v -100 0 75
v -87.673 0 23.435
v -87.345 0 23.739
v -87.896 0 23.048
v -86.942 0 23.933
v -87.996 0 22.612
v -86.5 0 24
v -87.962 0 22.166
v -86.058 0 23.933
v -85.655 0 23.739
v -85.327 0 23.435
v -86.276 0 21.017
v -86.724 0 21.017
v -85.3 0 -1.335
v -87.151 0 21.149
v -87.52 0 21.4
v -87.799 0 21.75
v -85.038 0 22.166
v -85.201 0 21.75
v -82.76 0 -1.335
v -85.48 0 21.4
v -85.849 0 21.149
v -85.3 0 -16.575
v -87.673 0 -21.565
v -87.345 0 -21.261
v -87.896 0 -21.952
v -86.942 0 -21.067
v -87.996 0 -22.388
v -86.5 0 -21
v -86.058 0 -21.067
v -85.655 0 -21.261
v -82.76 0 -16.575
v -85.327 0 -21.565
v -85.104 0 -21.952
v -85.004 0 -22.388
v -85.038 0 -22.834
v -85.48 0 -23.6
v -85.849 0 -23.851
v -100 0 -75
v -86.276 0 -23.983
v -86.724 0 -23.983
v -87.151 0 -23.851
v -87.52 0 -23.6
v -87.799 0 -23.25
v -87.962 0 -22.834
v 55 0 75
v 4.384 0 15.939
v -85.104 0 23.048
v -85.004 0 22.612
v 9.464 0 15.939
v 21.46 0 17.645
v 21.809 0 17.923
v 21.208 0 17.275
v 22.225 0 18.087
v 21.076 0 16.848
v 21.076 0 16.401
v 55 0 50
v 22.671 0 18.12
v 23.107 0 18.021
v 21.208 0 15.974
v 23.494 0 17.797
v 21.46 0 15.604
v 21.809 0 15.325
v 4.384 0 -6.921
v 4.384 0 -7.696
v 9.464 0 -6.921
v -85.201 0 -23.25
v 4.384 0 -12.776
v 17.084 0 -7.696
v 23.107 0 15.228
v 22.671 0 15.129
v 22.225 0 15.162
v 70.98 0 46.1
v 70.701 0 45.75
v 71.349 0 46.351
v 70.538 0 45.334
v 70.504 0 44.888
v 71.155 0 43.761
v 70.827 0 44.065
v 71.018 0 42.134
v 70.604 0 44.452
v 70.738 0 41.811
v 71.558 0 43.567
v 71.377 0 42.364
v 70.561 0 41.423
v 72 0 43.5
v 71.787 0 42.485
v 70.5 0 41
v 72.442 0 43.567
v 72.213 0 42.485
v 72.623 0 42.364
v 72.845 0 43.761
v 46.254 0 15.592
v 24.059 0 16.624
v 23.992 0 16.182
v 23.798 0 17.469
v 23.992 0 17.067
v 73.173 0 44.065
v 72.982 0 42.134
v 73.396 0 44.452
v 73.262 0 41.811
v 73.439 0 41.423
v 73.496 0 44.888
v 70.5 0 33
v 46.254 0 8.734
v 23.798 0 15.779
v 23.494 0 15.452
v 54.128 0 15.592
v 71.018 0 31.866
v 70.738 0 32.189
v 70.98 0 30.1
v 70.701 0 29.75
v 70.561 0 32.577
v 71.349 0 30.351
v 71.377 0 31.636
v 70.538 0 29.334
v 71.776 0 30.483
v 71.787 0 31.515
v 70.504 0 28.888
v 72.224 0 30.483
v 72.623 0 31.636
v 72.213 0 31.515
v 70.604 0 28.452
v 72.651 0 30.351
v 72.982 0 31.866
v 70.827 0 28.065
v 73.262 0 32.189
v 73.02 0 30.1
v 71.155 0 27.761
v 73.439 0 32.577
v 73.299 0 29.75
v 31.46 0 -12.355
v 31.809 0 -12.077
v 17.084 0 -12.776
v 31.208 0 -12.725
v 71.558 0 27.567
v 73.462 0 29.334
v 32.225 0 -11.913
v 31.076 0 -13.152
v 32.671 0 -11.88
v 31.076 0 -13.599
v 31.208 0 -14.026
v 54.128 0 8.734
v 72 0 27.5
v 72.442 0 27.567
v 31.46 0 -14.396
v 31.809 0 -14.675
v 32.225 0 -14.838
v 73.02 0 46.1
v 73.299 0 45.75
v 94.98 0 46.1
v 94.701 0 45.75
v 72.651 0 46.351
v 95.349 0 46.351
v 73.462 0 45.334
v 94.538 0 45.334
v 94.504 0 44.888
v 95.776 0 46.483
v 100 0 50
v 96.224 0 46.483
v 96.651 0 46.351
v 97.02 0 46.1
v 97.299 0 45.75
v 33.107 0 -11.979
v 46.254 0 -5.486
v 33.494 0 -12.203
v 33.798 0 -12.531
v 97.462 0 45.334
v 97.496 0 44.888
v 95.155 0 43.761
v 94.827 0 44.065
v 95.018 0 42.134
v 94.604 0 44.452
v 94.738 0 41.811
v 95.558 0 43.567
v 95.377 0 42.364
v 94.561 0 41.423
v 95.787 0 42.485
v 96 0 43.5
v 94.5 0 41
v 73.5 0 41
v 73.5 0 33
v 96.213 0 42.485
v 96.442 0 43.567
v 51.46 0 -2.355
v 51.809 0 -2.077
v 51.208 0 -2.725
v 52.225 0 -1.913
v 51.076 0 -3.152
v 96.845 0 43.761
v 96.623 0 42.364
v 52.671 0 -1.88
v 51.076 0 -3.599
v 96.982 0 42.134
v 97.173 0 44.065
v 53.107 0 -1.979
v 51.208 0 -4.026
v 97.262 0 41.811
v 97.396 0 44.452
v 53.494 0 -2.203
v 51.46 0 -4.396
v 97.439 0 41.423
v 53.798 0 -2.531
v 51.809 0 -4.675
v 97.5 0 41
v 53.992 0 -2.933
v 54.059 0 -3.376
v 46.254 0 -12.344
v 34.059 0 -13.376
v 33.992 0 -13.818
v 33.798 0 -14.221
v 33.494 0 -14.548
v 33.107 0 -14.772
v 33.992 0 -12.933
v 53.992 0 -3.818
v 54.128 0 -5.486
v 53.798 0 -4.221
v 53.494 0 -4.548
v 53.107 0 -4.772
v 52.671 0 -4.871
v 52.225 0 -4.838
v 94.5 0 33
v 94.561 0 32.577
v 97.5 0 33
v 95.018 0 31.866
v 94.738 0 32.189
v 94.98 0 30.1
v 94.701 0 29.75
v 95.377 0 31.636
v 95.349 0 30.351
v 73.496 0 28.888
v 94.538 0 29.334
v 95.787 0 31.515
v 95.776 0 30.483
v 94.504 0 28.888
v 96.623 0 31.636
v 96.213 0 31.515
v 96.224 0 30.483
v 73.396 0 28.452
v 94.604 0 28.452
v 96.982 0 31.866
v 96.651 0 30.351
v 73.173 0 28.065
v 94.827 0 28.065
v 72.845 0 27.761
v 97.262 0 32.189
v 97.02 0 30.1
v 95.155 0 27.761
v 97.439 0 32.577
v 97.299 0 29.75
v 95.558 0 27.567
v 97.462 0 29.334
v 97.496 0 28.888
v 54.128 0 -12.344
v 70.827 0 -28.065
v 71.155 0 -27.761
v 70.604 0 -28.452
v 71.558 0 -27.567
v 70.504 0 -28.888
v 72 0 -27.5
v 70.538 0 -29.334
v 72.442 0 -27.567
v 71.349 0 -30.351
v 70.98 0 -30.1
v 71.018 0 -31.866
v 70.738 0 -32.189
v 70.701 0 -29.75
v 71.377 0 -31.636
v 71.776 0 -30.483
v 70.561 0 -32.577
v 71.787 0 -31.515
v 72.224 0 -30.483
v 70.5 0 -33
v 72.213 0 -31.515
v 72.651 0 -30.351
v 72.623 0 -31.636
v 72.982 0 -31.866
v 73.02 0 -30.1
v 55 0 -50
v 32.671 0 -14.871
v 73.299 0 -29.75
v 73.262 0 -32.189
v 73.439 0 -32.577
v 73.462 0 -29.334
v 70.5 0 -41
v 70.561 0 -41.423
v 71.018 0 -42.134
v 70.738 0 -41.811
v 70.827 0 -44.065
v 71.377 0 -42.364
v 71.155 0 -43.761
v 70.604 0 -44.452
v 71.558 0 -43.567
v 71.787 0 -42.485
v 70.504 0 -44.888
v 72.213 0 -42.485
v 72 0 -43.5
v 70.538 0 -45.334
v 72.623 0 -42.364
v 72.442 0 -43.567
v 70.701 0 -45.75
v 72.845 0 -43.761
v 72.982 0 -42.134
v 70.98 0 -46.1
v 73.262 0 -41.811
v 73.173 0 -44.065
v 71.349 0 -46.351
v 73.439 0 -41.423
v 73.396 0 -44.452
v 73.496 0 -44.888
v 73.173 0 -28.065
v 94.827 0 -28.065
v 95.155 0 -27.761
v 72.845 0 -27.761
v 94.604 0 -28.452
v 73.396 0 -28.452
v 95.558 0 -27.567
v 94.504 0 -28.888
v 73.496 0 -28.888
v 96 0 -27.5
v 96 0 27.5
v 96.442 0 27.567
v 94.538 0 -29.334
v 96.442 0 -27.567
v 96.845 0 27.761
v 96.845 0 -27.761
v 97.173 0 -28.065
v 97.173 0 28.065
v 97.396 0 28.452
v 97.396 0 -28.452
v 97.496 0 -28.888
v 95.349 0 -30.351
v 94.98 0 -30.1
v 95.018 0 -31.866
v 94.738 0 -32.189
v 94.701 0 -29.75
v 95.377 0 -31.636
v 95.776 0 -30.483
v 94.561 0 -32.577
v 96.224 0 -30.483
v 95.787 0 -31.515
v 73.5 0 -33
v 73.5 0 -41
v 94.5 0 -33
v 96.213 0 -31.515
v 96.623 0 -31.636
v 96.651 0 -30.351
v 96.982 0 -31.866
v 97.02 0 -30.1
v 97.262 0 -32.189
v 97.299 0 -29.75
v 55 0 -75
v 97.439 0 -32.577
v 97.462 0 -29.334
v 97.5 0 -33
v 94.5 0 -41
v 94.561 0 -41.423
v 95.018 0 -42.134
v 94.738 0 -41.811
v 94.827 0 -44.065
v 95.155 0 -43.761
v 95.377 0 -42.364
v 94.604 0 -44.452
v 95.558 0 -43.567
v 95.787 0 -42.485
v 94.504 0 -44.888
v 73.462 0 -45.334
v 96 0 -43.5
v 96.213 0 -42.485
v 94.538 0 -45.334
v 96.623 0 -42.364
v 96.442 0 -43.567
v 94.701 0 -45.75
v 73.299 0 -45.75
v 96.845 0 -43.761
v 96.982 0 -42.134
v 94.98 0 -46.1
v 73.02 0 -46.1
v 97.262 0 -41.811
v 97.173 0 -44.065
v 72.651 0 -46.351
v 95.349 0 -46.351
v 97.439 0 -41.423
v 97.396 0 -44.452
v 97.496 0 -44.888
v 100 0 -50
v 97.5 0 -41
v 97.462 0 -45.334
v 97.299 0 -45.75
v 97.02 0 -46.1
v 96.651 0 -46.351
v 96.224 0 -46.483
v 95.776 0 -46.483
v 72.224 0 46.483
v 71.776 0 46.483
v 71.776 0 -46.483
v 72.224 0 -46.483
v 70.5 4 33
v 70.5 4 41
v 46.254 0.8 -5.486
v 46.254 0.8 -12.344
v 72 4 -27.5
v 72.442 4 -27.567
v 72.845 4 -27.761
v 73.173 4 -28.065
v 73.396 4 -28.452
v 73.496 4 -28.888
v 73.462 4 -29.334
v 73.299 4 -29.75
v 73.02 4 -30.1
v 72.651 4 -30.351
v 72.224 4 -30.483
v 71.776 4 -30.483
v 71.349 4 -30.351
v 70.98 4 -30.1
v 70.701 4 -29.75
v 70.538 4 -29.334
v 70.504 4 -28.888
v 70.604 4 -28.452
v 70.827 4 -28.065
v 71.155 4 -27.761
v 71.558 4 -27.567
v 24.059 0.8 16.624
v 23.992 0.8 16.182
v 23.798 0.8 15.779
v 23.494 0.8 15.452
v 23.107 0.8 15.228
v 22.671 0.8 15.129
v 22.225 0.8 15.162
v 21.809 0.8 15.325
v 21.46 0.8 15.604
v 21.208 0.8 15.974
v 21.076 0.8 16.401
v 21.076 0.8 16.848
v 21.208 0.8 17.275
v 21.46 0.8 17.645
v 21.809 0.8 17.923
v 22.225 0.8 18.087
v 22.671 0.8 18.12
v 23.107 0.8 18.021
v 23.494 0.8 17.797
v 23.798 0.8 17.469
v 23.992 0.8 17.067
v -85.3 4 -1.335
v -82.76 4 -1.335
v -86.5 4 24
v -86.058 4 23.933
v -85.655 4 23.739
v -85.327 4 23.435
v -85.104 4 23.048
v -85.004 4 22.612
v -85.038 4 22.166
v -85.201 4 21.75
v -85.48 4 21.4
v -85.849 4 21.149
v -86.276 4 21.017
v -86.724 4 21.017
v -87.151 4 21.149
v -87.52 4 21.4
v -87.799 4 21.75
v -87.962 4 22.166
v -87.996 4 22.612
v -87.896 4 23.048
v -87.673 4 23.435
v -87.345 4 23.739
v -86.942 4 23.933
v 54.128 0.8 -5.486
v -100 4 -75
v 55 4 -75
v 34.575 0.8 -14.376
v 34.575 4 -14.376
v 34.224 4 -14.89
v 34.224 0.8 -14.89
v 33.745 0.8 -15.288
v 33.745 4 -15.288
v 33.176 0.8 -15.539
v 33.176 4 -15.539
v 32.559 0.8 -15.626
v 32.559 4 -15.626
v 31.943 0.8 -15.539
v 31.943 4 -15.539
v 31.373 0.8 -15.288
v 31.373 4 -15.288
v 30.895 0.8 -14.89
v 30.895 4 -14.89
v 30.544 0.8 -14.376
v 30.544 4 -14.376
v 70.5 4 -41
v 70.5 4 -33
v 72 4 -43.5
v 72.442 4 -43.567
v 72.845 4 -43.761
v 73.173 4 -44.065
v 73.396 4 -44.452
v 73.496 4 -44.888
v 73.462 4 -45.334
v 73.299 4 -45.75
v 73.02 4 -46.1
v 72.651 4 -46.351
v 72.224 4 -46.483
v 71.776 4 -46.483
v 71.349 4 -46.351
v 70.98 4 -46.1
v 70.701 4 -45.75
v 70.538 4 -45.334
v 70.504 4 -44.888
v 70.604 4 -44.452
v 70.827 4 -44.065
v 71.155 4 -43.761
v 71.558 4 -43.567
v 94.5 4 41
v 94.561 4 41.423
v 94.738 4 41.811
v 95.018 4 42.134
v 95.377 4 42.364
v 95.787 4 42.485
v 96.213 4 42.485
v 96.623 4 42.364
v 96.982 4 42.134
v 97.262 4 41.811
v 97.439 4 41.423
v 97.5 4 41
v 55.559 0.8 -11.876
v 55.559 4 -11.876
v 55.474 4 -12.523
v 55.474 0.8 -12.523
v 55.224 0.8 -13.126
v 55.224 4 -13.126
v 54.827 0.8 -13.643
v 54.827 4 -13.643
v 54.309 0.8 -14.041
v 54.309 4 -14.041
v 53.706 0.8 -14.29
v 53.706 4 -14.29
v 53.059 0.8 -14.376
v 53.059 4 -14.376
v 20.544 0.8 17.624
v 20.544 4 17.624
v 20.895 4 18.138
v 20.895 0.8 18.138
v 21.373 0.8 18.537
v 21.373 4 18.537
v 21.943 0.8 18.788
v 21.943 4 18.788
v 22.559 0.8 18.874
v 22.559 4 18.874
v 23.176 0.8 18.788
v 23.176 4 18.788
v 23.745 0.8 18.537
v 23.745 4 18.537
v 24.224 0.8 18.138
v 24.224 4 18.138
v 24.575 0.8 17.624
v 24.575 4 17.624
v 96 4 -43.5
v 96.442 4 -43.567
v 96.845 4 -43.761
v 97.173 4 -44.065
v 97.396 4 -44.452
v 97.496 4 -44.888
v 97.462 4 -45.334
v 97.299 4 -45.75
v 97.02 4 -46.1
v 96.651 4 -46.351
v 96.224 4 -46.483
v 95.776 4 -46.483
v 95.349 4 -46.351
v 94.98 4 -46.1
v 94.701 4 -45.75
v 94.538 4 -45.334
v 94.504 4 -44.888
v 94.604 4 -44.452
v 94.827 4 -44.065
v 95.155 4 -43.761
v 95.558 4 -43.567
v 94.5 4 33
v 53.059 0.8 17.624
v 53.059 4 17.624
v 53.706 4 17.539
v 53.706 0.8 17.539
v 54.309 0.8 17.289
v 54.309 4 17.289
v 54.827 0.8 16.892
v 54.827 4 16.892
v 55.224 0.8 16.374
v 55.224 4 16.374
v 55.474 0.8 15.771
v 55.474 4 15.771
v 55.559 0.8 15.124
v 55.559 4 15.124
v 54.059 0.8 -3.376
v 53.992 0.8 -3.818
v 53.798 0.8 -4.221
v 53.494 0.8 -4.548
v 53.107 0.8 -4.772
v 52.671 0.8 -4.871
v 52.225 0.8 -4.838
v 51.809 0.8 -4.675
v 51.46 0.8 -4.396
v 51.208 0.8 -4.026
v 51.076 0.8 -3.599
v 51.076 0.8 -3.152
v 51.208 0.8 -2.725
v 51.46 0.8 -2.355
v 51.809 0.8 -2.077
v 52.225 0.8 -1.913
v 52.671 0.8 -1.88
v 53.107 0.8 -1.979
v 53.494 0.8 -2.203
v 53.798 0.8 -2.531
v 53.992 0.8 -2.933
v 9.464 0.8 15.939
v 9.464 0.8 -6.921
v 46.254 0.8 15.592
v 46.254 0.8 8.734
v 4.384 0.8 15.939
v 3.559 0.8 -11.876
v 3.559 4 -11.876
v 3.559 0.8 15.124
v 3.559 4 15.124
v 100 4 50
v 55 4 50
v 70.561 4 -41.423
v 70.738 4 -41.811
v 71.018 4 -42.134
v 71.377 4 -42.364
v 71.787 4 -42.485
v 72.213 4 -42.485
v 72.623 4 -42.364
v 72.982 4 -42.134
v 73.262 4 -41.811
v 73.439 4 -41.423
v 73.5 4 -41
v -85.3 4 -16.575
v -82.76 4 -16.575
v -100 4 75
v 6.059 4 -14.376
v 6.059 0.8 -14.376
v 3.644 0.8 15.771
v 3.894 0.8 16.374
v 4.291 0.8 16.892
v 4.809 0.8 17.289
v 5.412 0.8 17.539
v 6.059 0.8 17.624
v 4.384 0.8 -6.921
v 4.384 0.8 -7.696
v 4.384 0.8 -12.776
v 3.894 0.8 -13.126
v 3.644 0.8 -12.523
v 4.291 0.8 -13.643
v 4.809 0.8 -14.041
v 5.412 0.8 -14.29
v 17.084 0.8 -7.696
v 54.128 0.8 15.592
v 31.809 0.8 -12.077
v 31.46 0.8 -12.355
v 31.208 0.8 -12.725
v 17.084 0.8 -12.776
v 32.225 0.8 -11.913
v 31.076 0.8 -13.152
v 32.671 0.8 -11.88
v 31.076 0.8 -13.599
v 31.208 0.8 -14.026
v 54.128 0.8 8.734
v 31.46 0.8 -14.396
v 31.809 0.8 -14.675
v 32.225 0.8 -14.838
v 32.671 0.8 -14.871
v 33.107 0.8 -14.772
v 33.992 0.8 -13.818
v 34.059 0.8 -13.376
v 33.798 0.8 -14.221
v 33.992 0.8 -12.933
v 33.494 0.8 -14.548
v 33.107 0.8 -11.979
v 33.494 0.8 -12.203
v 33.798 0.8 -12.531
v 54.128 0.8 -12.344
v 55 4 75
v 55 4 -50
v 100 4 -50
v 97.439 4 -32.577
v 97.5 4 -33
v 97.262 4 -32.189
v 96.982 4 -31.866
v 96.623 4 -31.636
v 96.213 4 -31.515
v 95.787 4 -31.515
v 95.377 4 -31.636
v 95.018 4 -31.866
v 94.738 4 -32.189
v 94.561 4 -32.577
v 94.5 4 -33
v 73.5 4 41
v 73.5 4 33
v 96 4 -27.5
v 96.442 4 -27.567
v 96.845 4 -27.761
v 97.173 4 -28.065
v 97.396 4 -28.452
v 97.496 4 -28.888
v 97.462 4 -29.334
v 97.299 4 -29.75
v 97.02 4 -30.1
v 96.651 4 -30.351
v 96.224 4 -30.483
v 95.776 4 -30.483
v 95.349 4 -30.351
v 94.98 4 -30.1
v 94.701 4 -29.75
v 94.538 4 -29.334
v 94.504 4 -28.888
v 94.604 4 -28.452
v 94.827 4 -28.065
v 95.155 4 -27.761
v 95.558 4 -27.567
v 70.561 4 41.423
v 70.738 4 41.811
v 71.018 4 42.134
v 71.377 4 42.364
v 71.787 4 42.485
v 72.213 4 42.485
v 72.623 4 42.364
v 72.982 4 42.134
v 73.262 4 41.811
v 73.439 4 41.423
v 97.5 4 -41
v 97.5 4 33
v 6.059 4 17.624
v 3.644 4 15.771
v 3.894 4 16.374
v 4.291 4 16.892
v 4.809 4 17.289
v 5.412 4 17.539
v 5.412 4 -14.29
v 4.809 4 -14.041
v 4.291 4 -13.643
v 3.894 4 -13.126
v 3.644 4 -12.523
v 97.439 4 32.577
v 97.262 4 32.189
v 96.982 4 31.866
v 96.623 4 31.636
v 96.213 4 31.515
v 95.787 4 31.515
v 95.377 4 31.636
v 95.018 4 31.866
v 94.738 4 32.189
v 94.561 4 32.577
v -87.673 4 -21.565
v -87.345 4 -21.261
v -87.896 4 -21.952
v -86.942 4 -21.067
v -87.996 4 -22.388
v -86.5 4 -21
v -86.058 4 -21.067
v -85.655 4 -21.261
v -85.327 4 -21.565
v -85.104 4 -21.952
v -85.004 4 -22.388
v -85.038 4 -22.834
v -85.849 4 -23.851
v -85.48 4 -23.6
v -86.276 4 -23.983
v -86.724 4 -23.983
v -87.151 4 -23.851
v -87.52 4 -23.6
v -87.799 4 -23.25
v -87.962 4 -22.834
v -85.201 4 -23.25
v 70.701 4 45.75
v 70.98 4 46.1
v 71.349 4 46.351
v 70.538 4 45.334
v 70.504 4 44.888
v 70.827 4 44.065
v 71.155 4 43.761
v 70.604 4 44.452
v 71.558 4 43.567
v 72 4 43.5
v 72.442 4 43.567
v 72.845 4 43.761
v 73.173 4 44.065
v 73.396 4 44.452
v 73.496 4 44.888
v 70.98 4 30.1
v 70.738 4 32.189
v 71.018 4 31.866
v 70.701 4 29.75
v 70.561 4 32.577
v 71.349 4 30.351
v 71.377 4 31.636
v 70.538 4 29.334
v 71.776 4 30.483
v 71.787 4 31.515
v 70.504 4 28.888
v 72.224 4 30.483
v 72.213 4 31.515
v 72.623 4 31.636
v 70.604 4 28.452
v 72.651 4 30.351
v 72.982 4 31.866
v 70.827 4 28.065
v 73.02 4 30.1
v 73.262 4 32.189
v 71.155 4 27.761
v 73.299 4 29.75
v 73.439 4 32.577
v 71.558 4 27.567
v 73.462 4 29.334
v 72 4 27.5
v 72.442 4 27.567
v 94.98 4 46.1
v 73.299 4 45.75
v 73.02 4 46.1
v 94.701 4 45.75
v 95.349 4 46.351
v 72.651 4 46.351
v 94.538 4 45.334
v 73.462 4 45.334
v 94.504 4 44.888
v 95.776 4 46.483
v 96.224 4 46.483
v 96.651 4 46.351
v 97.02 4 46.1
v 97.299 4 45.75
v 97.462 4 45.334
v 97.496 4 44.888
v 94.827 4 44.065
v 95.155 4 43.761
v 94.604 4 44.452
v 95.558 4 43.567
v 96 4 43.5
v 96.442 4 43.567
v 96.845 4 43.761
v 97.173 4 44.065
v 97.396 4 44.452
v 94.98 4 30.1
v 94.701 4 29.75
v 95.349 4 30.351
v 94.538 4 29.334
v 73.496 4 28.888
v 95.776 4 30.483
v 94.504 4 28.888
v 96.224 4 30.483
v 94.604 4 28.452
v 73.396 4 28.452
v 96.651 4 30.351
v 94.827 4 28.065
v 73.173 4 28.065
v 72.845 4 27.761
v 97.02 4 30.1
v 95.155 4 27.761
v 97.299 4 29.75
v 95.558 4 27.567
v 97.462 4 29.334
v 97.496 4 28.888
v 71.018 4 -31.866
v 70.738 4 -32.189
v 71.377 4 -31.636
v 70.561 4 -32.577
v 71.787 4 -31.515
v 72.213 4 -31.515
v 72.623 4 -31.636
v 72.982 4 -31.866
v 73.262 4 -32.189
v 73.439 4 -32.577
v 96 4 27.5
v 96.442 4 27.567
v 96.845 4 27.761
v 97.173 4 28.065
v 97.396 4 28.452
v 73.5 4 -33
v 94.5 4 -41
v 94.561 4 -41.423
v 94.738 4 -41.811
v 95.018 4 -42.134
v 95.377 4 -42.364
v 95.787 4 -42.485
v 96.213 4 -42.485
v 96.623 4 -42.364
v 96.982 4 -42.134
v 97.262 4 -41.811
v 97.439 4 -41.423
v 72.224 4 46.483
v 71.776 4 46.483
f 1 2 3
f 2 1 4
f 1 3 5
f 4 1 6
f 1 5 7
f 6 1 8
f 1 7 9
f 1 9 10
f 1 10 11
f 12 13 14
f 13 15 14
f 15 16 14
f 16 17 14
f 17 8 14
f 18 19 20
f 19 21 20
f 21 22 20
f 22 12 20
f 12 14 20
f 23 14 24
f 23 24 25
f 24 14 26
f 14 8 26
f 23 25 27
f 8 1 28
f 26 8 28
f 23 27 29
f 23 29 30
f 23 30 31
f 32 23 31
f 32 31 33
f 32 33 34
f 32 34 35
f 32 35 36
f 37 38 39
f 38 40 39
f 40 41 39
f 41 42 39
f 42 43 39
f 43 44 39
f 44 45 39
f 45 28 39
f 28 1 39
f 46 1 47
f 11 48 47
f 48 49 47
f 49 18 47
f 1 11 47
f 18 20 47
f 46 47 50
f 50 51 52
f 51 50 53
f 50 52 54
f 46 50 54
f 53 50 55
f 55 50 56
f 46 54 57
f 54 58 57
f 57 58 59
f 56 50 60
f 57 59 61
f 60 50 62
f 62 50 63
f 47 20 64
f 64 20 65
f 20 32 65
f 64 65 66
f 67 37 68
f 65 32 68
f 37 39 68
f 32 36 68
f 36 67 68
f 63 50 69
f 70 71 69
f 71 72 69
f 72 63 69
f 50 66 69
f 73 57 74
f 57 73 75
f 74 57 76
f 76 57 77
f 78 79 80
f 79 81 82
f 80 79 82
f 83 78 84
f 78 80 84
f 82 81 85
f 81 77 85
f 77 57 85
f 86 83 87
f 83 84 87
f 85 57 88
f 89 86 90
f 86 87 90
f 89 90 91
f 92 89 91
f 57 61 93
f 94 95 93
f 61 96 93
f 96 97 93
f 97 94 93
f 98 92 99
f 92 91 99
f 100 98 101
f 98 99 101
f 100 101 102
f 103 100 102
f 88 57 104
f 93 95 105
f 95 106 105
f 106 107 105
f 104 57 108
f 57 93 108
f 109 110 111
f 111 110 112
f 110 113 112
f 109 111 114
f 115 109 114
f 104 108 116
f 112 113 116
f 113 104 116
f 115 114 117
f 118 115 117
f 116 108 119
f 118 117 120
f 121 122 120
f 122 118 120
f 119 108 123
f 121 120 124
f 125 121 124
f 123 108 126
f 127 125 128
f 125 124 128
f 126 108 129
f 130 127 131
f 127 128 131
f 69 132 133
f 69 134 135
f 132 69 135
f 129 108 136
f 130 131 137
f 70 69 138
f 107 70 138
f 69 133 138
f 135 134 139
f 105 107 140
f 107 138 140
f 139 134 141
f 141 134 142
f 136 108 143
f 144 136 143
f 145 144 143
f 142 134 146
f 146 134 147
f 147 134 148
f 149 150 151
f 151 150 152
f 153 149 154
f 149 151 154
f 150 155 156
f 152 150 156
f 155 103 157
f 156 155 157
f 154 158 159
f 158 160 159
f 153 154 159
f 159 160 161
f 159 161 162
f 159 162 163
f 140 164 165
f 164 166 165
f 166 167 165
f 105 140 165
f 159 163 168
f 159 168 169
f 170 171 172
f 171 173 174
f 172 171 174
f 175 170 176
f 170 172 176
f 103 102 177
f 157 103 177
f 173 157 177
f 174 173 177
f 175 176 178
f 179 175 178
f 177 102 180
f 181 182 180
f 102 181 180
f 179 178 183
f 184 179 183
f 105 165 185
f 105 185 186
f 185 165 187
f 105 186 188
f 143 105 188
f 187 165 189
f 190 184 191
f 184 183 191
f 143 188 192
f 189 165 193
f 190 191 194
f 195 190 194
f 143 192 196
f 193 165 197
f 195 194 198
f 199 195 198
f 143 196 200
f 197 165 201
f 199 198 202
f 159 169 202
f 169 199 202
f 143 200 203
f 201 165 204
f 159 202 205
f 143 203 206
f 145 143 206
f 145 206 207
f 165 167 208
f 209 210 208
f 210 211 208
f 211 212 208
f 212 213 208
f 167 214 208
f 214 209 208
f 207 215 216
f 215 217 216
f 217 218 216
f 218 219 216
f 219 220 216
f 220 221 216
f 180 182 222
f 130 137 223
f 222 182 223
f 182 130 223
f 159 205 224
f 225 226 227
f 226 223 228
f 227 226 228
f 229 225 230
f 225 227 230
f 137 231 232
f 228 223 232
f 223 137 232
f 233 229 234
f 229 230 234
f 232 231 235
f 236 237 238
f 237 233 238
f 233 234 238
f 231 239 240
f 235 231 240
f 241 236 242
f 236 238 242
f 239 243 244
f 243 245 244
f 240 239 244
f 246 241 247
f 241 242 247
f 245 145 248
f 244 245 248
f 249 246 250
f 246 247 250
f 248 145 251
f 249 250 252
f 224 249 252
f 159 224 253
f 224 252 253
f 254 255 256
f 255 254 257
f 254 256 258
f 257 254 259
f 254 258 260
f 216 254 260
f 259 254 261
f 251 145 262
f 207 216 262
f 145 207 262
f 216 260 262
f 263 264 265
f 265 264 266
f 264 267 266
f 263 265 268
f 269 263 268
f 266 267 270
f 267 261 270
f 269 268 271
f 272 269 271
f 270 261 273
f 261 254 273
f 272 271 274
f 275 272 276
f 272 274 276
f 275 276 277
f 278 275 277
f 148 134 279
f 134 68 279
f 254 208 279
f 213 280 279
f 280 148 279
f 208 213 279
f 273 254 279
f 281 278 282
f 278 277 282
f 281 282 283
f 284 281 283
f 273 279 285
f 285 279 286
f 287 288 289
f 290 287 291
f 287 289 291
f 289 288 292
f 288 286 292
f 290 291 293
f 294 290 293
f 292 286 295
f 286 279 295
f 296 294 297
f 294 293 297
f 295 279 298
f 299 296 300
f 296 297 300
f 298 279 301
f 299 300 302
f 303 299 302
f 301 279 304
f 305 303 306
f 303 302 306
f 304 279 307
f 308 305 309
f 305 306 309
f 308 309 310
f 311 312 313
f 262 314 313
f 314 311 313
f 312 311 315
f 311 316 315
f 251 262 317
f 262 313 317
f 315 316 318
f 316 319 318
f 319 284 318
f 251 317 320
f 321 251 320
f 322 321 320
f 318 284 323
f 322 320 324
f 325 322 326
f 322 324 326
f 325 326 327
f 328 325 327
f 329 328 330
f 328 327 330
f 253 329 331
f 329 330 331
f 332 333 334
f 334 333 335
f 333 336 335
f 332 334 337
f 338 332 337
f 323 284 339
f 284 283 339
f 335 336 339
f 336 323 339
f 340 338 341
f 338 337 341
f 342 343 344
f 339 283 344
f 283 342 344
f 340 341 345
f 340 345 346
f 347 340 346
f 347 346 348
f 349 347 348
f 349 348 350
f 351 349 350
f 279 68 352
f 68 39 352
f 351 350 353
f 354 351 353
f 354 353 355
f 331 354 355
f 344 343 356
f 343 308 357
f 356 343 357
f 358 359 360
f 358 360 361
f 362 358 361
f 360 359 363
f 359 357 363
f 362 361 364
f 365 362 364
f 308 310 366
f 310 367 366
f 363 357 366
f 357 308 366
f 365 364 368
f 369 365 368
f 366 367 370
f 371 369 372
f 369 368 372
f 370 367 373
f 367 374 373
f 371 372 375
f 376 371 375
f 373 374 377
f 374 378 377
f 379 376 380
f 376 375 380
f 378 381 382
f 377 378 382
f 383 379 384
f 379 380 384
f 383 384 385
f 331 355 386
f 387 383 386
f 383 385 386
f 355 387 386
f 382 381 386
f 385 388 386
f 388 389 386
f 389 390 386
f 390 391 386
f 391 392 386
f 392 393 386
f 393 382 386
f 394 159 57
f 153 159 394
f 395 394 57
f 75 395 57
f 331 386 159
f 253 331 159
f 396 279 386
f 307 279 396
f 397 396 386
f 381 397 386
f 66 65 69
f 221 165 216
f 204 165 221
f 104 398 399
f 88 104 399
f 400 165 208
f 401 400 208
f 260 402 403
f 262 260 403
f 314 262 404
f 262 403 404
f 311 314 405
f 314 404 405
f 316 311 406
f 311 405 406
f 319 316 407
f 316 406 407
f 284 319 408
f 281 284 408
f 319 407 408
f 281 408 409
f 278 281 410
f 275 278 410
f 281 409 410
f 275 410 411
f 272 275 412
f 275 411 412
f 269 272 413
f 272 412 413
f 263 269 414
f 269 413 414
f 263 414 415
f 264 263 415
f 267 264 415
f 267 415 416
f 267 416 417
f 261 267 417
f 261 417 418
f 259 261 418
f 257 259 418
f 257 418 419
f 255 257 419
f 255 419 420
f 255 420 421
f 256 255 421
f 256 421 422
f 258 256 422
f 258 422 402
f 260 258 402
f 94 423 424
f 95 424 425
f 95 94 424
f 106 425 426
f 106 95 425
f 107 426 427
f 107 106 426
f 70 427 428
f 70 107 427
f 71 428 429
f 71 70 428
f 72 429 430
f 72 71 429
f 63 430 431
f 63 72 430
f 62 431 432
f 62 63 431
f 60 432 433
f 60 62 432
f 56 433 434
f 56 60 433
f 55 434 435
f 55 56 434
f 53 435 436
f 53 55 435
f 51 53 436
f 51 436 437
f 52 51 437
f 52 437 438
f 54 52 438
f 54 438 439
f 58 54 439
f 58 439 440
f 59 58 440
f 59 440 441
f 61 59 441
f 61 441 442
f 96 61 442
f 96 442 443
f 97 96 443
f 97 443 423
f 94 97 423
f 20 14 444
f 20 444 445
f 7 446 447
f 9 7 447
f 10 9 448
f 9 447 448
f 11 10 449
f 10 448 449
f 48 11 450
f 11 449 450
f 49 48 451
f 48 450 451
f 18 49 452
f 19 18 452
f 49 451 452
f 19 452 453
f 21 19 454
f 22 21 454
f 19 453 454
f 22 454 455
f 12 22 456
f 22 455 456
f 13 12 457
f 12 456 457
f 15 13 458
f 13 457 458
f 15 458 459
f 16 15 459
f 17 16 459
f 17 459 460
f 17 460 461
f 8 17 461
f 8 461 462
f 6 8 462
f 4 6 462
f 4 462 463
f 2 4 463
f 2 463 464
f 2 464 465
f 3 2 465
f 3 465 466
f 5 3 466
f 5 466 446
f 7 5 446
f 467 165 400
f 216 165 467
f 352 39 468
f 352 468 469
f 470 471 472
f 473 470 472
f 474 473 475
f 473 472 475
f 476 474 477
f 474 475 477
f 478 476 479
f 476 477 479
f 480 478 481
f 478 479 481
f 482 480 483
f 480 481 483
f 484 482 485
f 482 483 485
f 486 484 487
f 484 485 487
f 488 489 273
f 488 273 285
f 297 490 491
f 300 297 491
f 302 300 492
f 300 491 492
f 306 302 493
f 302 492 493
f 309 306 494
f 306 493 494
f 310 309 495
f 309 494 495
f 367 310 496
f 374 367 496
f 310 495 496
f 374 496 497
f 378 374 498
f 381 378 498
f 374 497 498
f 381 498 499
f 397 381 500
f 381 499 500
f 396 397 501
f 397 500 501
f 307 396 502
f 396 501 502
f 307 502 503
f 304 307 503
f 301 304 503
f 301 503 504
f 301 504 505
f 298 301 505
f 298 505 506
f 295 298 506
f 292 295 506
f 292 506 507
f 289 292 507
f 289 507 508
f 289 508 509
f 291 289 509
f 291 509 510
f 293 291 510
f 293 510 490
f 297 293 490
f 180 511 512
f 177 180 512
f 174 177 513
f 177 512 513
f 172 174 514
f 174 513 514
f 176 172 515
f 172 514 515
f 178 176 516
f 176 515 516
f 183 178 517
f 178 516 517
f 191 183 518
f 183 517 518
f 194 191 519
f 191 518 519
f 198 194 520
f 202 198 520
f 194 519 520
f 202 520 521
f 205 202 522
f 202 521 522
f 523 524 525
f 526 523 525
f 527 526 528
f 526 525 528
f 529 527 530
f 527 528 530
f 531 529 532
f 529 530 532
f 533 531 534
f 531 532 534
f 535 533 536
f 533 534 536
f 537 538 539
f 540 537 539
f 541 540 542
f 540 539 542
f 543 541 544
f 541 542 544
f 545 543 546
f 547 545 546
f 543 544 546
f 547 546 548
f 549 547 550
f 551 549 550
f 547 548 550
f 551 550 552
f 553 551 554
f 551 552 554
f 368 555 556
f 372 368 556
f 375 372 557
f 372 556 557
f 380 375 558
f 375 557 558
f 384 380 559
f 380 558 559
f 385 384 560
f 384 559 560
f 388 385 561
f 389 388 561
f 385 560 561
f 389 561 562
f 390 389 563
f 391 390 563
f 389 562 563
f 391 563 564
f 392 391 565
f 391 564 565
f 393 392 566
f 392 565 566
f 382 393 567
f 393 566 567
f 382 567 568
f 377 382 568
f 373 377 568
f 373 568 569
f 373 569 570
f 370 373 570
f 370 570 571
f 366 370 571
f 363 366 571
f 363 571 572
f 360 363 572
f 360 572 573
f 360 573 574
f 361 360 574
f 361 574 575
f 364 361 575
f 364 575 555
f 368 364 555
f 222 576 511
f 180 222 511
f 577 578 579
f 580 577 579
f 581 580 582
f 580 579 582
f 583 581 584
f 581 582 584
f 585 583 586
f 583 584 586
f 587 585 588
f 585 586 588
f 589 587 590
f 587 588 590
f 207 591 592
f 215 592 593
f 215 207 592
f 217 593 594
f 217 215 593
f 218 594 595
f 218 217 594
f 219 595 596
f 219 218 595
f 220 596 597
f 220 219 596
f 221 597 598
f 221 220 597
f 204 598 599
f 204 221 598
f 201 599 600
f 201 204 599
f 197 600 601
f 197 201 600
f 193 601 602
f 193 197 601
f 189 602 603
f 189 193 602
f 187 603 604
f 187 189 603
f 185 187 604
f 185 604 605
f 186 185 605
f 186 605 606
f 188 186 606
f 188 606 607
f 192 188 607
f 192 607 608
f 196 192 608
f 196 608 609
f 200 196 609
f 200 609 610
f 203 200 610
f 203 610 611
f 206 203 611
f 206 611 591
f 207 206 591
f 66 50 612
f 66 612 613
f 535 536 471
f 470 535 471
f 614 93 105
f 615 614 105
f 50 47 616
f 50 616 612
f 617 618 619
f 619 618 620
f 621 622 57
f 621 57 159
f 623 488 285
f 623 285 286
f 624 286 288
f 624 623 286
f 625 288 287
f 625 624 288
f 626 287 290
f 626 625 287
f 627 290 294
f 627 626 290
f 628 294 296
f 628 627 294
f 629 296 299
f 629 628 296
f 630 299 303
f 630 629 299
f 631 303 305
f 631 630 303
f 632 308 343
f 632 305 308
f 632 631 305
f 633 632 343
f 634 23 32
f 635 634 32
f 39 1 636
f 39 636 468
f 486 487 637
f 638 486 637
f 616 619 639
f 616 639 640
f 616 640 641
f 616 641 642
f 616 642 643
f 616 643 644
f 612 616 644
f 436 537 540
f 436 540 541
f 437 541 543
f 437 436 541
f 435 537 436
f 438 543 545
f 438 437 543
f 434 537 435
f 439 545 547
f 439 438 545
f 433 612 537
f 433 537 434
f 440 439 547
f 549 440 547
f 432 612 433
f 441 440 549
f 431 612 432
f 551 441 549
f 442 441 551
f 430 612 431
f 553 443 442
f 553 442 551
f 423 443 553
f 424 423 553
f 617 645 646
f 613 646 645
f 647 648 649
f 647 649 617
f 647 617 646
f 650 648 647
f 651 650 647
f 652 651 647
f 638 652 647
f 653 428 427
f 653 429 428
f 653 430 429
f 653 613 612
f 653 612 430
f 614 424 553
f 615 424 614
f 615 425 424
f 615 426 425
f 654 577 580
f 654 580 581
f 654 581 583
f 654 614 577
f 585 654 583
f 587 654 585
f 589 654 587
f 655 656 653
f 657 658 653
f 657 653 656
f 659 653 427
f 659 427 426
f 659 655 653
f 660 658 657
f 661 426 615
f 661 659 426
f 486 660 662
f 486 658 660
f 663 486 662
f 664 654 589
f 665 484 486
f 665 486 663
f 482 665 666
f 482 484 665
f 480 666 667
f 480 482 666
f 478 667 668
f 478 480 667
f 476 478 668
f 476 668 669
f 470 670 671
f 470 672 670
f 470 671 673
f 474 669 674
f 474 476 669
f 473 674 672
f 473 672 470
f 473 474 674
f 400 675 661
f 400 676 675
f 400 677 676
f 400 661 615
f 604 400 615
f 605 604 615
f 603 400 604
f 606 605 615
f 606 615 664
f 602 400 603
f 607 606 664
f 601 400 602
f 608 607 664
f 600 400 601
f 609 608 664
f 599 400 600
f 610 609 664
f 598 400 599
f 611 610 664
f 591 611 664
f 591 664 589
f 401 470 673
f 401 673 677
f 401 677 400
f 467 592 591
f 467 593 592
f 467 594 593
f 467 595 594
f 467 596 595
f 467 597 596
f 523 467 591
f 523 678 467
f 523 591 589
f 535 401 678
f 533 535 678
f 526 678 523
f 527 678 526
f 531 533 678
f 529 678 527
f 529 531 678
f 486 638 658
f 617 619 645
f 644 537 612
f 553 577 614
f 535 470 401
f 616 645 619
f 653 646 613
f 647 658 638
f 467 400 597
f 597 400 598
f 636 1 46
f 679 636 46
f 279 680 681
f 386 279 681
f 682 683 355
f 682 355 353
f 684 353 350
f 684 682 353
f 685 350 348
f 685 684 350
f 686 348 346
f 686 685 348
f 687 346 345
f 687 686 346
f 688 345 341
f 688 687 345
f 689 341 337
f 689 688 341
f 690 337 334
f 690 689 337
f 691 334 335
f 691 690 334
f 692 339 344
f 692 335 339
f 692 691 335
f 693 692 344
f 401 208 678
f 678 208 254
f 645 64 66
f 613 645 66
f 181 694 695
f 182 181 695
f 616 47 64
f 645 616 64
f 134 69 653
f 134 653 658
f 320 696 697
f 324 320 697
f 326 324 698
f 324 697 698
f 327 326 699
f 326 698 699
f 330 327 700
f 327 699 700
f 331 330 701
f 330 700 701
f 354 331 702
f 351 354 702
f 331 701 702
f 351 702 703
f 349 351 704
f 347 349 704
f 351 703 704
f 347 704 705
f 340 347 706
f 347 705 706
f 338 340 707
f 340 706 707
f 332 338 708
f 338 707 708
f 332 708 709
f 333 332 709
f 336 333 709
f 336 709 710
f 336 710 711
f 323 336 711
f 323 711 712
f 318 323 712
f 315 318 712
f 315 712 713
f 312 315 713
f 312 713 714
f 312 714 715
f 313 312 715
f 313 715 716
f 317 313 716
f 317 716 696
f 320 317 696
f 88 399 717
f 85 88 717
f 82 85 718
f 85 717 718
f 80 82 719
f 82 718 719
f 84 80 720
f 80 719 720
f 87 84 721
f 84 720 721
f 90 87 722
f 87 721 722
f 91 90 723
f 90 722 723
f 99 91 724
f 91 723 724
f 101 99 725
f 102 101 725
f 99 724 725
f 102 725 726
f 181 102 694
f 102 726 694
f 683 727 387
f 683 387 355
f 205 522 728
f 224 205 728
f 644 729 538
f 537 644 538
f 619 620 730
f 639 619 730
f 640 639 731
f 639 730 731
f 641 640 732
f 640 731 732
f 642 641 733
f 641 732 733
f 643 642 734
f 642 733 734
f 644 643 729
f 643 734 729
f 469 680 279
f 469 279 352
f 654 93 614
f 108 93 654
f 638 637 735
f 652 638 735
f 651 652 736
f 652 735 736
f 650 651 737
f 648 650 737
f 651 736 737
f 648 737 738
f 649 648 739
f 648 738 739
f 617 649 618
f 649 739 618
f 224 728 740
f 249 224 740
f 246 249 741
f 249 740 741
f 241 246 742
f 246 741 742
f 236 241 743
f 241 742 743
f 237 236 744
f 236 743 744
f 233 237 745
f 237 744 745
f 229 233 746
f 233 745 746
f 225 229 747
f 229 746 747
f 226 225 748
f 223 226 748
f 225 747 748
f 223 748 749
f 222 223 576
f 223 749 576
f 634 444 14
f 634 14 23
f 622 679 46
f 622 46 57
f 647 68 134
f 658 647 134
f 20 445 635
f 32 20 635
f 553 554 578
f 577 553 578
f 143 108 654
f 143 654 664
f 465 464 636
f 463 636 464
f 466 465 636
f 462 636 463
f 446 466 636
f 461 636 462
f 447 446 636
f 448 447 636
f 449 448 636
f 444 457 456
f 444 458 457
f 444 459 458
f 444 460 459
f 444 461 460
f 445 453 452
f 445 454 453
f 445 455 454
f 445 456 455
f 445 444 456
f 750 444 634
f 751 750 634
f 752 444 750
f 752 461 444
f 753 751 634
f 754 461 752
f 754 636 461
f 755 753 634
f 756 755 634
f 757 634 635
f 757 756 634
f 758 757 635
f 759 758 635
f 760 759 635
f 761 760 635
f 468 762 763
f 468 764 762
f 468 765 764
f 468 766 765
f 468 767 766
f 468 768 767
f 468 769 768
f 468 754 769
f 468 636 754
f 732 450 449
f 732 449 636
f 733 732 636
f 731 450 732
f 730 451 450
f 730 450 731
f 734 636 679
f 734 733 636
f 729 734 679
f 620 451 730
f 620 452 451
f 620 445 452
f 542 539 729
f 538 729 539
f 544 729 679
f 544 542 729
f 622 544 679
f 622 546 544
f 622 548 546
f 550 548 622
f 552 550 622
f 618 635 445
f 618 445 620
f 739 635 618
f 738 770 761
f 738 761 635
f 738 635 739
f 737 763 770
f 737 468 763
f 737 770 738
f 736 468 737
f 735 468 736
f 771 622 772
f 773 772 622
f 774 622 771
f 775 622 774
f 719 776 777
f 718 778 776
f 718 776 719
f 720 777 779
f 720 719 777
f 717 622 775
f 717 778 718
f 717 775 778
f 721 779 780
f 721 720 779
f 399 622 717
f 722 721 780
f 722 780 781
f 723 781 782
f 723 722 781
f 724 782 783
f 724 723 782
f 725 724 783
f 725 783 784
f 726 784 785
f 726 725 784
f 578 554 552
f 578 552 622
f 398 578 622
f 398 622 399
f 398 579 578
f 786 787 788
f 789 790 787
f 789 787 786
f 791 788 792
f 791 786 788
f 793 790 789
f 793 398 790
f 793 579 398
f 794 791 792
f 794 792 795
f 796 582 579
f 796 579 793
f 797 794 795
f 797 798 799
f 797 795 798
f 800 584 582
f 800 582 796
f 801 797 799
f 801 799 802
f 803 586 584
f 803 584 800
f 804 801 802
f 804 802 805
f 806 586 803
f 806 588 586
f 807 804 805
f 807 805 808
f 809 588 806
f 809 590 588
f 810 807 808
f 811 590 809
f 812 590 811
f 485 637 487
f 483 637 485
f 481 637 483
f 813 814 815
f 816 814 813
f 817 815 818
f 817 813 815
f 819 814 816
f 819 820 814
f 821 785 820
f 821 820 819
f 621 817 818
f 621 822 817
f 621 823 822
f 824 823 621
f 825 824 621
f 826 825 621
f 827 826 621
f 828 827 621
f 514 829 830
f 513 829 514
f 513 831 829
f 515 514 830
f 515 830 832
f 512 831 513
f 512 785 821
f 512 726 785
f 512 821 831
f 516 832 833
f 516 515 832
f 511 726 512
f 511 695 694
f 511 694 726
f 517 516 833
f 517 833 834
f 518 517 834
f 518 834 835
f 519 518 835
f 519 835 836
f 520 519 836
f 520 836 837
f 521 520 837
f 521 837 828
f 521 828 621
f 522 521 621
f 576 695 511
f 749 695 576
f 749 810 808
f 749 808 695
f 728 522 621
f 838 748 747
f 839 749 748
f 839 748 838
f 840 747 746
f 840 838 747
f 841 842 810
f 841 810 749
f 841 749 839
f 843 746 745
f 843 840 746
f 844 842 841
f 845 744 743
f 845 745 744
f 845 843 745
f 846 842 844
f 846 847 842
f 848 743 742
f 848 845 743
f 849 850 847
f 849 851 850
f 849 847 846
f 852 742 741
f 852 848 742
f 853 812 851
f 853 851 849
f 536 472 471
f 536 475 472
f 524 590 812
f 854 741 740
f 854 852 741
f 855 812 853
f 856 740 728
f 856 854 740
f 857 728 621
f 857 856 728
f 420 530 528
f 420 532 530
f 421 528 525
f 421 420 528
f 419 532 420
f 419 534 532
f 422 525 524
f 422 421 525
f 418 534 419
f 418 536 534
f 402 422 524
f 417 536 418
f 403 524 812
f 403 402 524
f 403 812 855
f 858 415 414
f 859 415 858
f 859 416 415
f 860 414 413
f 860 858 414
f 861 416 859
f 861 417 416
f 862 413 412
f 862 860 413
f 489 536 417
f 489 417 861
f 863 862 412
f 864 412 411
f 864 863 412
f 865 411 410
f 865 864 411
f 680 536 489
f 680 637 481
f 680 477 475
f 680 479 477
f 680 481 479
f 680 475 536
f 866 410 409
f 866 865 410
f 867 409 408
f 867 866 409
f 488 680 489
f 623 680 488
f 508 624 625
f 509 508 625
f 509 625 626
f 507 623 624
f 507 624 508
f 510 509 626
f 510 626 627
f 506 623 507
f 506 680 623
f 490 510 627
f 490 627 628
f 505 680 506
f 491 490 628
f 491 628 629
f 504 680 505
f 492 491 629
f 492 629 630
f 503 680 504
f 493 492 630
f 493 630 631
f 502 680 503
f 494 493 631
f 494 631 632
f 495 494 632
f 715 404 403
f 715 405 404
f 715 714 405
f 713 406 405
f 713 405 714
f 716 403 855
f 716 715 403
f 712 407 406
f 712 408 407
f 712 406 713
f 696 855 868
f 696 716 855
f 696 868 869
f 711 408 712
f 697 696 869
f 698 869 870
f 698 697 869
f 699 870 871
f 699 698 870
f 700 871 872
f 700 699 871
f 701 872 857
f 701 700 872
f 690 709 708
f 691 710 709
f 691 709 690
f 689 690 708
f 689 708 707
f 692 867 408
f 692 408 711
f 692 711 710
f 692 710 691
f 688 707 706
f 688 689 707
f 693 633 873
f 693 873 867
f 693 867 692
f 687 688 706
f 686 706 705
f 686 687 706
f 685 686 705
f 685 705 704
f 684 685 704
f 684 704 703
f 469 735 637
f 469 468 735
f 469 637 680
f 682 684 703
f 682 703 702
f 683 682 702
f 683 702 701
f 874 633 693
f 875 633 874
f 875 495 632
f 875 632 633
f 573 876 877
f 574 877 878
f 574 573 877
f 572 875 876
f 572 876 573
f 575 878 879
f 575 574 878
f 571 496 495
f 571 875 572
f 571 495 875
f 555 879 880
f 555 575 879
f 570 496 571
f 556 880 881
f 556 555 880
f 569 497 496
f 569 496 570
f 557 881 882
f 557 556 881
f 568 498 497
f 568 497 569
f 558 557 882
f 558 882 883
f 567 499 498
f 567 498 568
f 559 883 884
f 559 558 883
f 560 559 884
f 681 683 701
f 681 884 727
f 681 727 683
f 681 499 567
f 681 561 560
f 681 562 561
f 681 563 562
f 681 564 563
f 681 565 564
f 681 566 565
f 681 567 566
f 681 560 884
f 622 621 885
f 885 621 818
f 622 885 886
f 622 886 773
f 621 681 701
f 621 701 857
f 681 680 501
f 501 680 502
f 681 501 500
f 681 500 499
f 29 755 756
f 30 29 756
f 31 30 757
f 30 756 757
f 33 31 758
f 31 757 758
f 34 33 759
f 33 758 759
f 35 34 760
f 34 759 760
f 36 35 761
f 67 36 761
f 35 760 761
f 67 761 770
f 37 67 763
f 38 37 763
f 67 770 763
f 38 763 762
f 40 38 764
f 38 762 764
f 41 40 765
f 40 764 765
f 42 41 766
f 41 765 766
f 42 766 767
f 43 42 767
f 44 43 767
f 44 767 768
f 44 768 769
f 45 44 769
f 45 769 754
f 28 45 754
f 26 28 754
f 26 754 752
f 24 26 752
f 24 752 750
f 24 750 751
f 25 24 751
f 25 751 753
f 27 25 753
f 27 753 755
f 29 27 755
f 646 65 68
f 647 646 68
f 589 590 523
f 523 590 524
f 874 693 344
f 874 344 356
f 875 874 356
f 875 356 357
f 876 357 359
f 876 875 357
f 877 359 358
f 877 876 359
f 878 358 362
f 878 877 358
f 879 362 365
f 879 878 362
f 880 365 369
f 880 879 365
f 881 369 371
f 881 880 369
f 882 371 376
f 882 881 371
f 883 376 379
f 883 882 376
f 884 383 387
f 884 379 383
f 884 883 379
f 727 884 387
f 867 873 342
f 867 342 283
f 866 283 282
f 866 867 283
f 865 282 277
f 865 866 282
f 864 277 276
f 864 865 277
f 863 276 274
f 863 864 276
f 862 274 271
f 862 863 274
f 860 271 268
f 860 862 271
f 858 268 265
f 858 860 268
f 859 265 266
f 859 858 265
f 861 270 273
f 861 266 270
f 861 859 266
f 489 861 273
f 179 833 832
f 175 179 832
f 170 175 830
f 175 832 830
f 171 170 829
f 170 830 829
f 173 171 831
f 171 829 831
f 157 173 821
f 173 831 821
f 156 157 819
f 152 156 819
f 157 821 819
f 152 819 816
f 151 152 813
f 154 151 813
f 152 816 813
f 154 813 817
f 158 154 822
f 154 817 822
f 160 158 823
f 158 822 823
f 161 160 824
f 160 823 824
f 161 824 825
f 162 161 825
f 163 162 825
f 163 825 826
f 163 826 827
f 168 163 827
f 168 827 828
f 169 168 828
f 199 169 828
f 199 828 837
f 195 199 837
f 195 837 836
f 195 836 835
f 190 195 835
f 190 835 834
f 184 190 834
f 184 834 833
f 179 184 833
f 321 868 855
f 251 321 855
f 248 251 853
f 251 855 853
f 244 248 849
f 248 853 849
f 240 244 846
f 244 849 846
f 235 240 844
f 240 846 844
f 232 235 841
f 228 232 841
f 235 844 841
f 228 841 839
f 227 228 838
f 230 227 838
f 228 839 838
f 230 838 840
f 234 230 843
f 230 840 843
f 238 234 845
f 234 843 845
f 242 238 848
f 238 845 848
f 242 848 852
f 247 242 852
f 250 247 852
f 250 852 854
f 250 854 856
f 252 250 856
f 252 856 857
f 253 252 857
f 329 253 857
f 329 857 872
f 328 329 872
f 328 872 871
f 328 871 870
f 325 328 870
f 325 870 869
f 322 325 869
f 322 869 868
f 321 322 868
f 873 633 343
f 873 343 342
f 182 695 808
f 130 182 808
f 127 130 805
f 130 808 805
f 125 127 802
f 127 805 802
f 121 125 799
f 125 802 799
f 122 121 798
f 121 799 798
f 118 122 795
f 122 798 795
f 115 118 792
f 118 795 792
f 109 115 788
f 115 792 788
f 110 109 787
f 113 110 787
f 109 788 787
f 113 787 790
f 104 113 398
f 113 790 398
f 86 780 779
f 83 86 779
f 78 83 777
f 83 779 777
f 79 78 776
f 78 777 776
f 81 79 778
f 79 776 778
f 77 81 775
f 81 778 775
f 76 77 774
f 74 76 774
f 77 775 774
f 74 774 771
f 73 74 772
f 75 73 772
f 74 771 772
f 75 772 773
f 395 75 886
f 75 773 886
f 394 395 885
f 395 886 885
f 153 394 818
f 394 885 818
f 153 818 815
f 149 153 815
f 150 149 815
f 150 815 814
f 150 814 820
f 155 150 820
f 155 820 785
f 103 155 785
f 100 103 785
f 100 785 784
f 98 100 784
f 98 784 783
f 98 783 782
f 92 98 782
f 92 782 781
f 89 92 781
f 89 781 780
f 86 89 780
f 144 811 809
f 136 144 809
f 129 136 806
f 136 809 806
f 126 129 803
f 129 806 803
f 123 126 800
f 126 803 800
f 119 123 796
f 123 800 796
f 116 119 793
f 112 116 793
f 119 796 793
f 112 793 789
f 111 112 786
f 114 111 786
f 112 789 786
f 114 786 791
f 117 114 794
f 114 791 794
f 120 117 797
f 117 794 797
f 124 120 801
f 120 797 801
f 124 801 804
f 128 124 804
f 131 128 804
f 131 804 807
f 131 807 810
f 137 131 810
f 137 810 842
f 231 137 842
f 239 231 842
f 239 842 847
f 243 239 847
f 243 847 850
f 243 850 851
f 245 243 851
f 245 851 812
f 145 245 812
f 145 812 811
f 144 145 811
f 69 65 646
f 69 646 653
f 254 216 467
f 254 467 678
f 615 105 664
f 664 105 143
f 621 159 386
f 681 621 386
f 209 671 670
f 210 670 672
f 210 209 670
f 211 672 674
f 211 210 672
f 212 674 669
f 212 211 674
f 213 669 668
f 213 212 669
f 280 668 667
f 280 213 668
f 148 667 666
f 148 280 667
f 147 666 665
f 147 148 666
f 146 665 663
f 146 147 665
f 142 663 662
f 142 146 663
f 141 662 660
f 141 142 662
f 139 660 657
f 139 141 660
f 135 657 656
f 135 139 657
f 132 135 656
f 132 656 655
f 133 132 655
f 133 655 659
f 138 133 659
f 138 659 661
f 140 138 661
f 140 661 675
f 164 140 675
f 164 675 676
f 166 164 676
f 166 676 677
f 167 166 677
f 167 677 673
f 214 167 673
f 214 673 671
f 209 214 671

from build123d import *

# Parameters (mm, degrees)
SKETCH_1_W             = 200
SKETCH_1_H             = 150
EXTRUDE_1196_DEPTH     = 4
SKETCH_1250_R          = 1.5
SKETCH_1250_W          = 12.7
SKETCH_1250_H          = 5.08
SKETCH_1250_W_2        = 5.08
SKETCH_1250_H_2        = 22.86
SKETCH_1250_W_3        = 7.874
SKETCH_1250_H_3        = 6.858
DMOTOR_DEPTH           = 3.2
DMOTOR_2_OUTLINE_R     = 1.5
DMOTOR_2_OUTLINE_W     = 7.874
DMOTOR_2_OUTLINE_H     = 6.858
DMOTOR_2_OUTLINE_W_2   = 12.7
DMOTOR_2_OUTLINE_H_2   = 5.08
DMOTOR_2_OUTLINE_W_3   = 5.08
DMOTOR_2_OUTLINE_H_3   = 22.86
DMOTOR_2_DEPTH         = 4
LINELANCE_2_R          = 1.5
LINELANCE_2_W          = 2.54
LINELANCE_2_H          = 15.24
LINELANCE_DEPTH        = 126.063983624
SKETCH_3356_R          = 1.5
SKETCH_3356_W          = 45
SKETCH_3356_H          = 25
CUT_EXTRUDE_4137_DEPTH = 126.063983624


# Read off the part's stored shape, not the designer's step: Вырез для компонентов DMotor
with BuildPart() as part:
    # Эскиз1 → Extrude 1196 (new body)
    with BuildSketch(Plane(origin=(0, 0, 0), x_dir=(1, 0, 0), z_dir=(0, 1, 0))):
        Rectangle(SKETCH_1_W, SKETCH_1_H)
    extrude(amount=EXTRUDE_1196_DEPTH)

    # Sketch 1250 → DMotor (cut)
    with BuildSketch(Plane(origin=(0, 4, 0), x_dir=(1, 0, 0), z_dir=(0, 1, 0))):
        with BuildLine():
            Line((30.543559349, 14.375593505), (6.059123786, 14.375593505))
            ThreePointArc((6.059123786, 14.375593505), (4.291356833, 13.643360458), (3.559123786, 11.875593505))
            Line((3.559123786, 11.875593505), (3.559123786, -15.124406495))
            ThreePointArc((3.559123786, -15.124406495), (4.291356833, -16.892173448), (6.059123786, -17.624406495))
            Line((6.059123786, -17.624406495), (20.543559349, -17.624406495))
            ThreePointArc((20.543559349, -17.624406495), (22.559123786, -18.874406495), (24.574688223, -17.624406495))
            Line((24.574688223, -17.624406495), (53.059123786, -17.624406495))
            ThreePointArc((53.059123786, -17.624406495), (54.826890739, -16.892173448), (55.559123786, -15.124406495))
            Line((55.559123786, -15.124406495), (55.559123786, 11.875593505))
            ThreePointArc((55.559123786, 11.875593505), (54.826890739, 13.643360458), (53.059123786, 14.375593505))
            Line((53.059123786, 14.375593505), (34.574688223, 14.375593505))
            ThreePointArc((34.574688223, 14.375593505), (32.559123786, 15.625593505), (30.543559349, 14.375593505))
        make_face()
        with Locations(Location((22.559123786, -16.624406495, 0), (0, 0, 270))):
            Circle(SKETCH_1250_R, mode=Mode.SUBTRACT)
        with Locations(Location((32.559123786, 13.375593505, 0), (0, 0, 270))):
            Circle(SKETCH_1250_R, mode=Mode.SUBTRACT)
        with Locations(Location((52.559123786, 3.375593505, 0), (0, 0, 270))):
            Circle(SKETCH_1250_R, mode=Mode.SUBTRACT)
        with Locations((10.734123786, 10.235593505)):
            Rectangle(SKETCH_1250_W, SKETCH_1250_H, mode=Mode.SUBTRACT)
        with Locations((6.924123786, -4.509406495)):
            Rectangle(SKETCH_1250_W_2, SKETCH_1250_H_2, mode=Mode.SUBTRACT)
        with Locations((50.191123786, 8.914593505)):
            Rectangle(SKETCH_1250_W_3, SKETCH_1250_H_3, mode=Mode.SUBTRACT)
        with Locations((50.191123786, -12.163406495)):
            Rectangle(SKETCH_1250_W_3, SKETCH_1250_H_3, mode=Mode.SUBTRACT)
    extrude(amount=-DMOTOR_DEPTH, mode=Mode.SUBTRACT)

    # DMotor 2 outline → DMotor 2 (cut)
    with BuildSketch(Plane(origin=(0, 0, 0), x_dir=(1, 0, 0), z_dir=(0, 1, 0))):
        with Locations((32.559123786, 13.375593505)):
            Circle(DMOTOR_2_OUTLINE_R)
        with Locations((50.191123786, -12.163406495)):
            Rectangle(DMOTOR_2_OUTLINE_W, DMOTOR_2_OUTLINE_H)
        with Locations((50.191123786, 8.914593505)):
            Rectangle(DMOTOR_2_OUTLINE_W, DMOTOR_2_OUTLINE_H)
        with Locations((10.734123786, 10.235593505)):
            Rectangle(DMOTOR_2_OUTLINE_W_2, DMOTOR_2_OUTLINE_H_2)
        with Locations((6.924123786, -4.509406495)):
            Rectangle(DMOTOR_2_OUTLINE_W_3, DMOTOR_2_OUTLINE_H_3)
        with Locations((22.559123786, -16.624406495)):
            Circle(DMOTOR_2_OUTLINE_R)
        with Locations((52.559123786, 3.375593505)):
            Circle(DMOTOR_2_OUTLINE_R)
    extrude(amount=DMOTOR_2_DEPTH, mode=Mode.SUBTRACT)

    # Linelance 2 → Linelance (cut, through all)
    with BuildSketch(Plane(origin=(0, 4, 0), x_dir=(1, 0, 0), z_dir=(0, 1, 0))):
        with Locations(Location((-86.5, 22.5, 0), (0, 0, 270))):
            Circle(LINELANCE_2_R)
        with Locations(Location((-86.5, -22.5, 0), (0, 0, 270))):
            Circle(LINELANCE_2_R)
        with Locations((-84.03, 8.955)):
            Rectangle(LINELANCE_2_W, LINELANCE_2_H)
    extrude(amount=-LINELANCE_DEPTH, mode=Mode.SUBTRACT)

    # Sketch 3356 → Cut-Extrude 4137 (cut, through all)
    with BuildSketch(Plane(origin=(0, 4, 0), x_dir=(1, 0, 0), z_dir=(0, 1, 0))):
        with Locations(Location((72, 45, 0), (0, 0, 270))):
            Circle(SKETCH_3356_R)
        with Locations(Location((72, 29, 0), (0, 0, 270))):
            Circle(SKETCH_3356_R)
        with Locations(Location((96, 45, 0), (0, 0, 270))):
            Circle(SKETCH_3356_R)
        with Locations(Location((96, 29, 0), (0, 0, 270))):
            Circle(SKETCH_3356_R)
        with Locations(Location((96, -29, 0), (0, 0, 90))):
            Circle(SKETCH_3356_R)
        with Locations(Location((96, -45, 0), (0, 0, 90))):
            Circle(SKETCH_3356_R)
        with Locations(Location((72, -29, 0), (0, 0, 90))):
            Circle(SKETCH_3356_R)
        with Locations(Location((72, -45, 0), (0, 0, 90))):
            Circle(SKETCH_3356_R)
        with Locations((77.5, 62.5)):
            Rectangle(SKETCH_3356_W, SKETCH_3356_H)
        with Locations((77.5, -62.5)):
            Rectangle(SKETCH_3356_W, SKETCH_3356_H)
        with BuildLine():
            Line((73.5, 41), (73.5, 33))
            ThreePointArc((73.5, 33), (72, 31.5), (70.5, 33))
            Line((70.5, 33), (70.5, 41))
            ThreePointArc((70.5, 41), (72, 42.5), (73.5, 41))
        make_face()
        with BuildLine():
            Line((97.5, 41), (97.5, 33))
            ThreePointArc((97.5, 33), (96, 31.5), (94.5, 33))
            Line((94.5, 33), (94.5, 41))
            ThreePointArc((94.5, 41), (96, 42.5), (97.5, 41))
        make_face()
        with BuildLine():
            Line((73.5, -41), (73.5, -33))
            ThreePointArc((73.5, -33), (72, -31.5), (70.5, -33))
            Line((70.5, -33), (70.5, -41))
            ThreePointArc((70.5, -41), (72, -42.5), (73.5, -41))
        make_face()
        with BuildLine():
            Line((97.5, -41), (97.5, -33))
            ThreePointArc((97.5, -33), (96, -31.5), (94.5, -33))
            Line((94.5, -33), (94.5, -41))
            ThreePointArc((94.5, -41), (96, -42.5), (97.5, -41))
        make_face()
    extrude(amount=-CUT_EXTRUDE_4137_DEPTH, mode=Mode.SUBTRACT)


solid = part.part
